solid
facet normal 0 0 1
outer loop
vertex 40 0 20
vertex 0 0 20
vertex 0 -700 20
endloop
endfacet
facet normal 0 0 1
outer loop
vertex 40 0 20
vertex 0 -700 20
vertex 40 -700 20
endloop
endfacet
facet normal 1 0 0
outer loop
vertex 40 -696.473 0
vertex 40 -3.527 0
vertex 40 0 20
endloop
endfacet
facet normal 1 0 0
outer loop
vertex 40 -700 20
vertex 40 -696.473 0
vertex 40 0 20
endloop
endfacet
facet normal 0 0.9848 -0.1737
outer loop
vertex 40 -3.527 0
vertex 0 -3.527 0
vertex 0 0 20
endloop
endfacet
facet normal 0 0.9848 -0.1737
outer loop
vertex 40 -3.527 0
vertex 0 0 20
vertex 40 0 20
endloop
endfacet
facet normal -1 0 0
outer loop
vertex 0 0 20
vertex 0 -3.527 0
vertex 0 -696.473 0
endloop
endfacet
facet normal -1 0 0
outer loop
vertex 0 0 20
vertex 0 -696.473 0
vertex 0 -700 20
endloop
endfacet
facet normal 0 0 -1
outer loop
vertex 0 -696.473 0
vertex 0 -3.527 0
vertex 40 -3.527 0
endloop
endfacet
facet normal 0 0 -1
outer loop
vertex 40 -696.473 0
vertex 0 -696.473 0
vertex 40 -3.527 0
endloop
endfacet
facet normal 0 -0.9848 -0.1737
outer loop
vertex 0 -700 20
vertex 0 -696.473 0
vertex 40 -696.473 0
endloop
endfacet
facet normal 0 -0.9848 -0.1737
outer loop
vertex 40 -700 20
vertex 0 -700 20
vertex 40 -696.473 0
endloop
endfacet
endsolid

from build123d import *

# Parameters (mm, degrees)
F0_W     = 40
F0_H     = 20
F1_DEPTH = 700
F2_SIZE2 = 3.52653
F2_SIZE  = 19.99999
F3_SIZE2 = 3.52653
F3_SIZE  = 19.99999


# Not quite as in the source:
# - a fillet or chamfer is up to 0.001 mm smaller than in the source, because OpenCascade refuses the exact size


with BuildPart() as f1:
    # F0 (on Front) → F1 (new body)
    with BuildSketch(Plane.XZ):
        with Locations((20, 10)):
            Rectangle(F0_W, F0_H)
    extrude(amount=F1_DEPTH)

    # F2 (size 20 and 3.5265396142 in the source; OpenCascade refuses exactly that, so slightly less here)
    f2_edges = [f1.edges().sort_by_distance(p)[0] for p in [
        (20, -700, 0),
    ]]
    f2_side = f1.faces().sort_by_distance((20, -700, 10))[0]
    chamfer(f2_edges, length=F2_SIZE, length2=F2_SIZE2, reference=f2_side)

    # F3 (size 20 and 3.5265396142 in the source; OpenCascade refuses exactly that, so slightly less here)
    f3_edges = [f1.edges().sort_by_distance(p)[0] for p in [
        (20, 0, 0),
    ]]
    f3_side = f1.faces().sort_by_distance((20, 0, 10))[0]
    chamfer(f3_edges, length=F3_SIZE, length2=F3_SIZE2, reference=f3_side)


solid = f1.part
